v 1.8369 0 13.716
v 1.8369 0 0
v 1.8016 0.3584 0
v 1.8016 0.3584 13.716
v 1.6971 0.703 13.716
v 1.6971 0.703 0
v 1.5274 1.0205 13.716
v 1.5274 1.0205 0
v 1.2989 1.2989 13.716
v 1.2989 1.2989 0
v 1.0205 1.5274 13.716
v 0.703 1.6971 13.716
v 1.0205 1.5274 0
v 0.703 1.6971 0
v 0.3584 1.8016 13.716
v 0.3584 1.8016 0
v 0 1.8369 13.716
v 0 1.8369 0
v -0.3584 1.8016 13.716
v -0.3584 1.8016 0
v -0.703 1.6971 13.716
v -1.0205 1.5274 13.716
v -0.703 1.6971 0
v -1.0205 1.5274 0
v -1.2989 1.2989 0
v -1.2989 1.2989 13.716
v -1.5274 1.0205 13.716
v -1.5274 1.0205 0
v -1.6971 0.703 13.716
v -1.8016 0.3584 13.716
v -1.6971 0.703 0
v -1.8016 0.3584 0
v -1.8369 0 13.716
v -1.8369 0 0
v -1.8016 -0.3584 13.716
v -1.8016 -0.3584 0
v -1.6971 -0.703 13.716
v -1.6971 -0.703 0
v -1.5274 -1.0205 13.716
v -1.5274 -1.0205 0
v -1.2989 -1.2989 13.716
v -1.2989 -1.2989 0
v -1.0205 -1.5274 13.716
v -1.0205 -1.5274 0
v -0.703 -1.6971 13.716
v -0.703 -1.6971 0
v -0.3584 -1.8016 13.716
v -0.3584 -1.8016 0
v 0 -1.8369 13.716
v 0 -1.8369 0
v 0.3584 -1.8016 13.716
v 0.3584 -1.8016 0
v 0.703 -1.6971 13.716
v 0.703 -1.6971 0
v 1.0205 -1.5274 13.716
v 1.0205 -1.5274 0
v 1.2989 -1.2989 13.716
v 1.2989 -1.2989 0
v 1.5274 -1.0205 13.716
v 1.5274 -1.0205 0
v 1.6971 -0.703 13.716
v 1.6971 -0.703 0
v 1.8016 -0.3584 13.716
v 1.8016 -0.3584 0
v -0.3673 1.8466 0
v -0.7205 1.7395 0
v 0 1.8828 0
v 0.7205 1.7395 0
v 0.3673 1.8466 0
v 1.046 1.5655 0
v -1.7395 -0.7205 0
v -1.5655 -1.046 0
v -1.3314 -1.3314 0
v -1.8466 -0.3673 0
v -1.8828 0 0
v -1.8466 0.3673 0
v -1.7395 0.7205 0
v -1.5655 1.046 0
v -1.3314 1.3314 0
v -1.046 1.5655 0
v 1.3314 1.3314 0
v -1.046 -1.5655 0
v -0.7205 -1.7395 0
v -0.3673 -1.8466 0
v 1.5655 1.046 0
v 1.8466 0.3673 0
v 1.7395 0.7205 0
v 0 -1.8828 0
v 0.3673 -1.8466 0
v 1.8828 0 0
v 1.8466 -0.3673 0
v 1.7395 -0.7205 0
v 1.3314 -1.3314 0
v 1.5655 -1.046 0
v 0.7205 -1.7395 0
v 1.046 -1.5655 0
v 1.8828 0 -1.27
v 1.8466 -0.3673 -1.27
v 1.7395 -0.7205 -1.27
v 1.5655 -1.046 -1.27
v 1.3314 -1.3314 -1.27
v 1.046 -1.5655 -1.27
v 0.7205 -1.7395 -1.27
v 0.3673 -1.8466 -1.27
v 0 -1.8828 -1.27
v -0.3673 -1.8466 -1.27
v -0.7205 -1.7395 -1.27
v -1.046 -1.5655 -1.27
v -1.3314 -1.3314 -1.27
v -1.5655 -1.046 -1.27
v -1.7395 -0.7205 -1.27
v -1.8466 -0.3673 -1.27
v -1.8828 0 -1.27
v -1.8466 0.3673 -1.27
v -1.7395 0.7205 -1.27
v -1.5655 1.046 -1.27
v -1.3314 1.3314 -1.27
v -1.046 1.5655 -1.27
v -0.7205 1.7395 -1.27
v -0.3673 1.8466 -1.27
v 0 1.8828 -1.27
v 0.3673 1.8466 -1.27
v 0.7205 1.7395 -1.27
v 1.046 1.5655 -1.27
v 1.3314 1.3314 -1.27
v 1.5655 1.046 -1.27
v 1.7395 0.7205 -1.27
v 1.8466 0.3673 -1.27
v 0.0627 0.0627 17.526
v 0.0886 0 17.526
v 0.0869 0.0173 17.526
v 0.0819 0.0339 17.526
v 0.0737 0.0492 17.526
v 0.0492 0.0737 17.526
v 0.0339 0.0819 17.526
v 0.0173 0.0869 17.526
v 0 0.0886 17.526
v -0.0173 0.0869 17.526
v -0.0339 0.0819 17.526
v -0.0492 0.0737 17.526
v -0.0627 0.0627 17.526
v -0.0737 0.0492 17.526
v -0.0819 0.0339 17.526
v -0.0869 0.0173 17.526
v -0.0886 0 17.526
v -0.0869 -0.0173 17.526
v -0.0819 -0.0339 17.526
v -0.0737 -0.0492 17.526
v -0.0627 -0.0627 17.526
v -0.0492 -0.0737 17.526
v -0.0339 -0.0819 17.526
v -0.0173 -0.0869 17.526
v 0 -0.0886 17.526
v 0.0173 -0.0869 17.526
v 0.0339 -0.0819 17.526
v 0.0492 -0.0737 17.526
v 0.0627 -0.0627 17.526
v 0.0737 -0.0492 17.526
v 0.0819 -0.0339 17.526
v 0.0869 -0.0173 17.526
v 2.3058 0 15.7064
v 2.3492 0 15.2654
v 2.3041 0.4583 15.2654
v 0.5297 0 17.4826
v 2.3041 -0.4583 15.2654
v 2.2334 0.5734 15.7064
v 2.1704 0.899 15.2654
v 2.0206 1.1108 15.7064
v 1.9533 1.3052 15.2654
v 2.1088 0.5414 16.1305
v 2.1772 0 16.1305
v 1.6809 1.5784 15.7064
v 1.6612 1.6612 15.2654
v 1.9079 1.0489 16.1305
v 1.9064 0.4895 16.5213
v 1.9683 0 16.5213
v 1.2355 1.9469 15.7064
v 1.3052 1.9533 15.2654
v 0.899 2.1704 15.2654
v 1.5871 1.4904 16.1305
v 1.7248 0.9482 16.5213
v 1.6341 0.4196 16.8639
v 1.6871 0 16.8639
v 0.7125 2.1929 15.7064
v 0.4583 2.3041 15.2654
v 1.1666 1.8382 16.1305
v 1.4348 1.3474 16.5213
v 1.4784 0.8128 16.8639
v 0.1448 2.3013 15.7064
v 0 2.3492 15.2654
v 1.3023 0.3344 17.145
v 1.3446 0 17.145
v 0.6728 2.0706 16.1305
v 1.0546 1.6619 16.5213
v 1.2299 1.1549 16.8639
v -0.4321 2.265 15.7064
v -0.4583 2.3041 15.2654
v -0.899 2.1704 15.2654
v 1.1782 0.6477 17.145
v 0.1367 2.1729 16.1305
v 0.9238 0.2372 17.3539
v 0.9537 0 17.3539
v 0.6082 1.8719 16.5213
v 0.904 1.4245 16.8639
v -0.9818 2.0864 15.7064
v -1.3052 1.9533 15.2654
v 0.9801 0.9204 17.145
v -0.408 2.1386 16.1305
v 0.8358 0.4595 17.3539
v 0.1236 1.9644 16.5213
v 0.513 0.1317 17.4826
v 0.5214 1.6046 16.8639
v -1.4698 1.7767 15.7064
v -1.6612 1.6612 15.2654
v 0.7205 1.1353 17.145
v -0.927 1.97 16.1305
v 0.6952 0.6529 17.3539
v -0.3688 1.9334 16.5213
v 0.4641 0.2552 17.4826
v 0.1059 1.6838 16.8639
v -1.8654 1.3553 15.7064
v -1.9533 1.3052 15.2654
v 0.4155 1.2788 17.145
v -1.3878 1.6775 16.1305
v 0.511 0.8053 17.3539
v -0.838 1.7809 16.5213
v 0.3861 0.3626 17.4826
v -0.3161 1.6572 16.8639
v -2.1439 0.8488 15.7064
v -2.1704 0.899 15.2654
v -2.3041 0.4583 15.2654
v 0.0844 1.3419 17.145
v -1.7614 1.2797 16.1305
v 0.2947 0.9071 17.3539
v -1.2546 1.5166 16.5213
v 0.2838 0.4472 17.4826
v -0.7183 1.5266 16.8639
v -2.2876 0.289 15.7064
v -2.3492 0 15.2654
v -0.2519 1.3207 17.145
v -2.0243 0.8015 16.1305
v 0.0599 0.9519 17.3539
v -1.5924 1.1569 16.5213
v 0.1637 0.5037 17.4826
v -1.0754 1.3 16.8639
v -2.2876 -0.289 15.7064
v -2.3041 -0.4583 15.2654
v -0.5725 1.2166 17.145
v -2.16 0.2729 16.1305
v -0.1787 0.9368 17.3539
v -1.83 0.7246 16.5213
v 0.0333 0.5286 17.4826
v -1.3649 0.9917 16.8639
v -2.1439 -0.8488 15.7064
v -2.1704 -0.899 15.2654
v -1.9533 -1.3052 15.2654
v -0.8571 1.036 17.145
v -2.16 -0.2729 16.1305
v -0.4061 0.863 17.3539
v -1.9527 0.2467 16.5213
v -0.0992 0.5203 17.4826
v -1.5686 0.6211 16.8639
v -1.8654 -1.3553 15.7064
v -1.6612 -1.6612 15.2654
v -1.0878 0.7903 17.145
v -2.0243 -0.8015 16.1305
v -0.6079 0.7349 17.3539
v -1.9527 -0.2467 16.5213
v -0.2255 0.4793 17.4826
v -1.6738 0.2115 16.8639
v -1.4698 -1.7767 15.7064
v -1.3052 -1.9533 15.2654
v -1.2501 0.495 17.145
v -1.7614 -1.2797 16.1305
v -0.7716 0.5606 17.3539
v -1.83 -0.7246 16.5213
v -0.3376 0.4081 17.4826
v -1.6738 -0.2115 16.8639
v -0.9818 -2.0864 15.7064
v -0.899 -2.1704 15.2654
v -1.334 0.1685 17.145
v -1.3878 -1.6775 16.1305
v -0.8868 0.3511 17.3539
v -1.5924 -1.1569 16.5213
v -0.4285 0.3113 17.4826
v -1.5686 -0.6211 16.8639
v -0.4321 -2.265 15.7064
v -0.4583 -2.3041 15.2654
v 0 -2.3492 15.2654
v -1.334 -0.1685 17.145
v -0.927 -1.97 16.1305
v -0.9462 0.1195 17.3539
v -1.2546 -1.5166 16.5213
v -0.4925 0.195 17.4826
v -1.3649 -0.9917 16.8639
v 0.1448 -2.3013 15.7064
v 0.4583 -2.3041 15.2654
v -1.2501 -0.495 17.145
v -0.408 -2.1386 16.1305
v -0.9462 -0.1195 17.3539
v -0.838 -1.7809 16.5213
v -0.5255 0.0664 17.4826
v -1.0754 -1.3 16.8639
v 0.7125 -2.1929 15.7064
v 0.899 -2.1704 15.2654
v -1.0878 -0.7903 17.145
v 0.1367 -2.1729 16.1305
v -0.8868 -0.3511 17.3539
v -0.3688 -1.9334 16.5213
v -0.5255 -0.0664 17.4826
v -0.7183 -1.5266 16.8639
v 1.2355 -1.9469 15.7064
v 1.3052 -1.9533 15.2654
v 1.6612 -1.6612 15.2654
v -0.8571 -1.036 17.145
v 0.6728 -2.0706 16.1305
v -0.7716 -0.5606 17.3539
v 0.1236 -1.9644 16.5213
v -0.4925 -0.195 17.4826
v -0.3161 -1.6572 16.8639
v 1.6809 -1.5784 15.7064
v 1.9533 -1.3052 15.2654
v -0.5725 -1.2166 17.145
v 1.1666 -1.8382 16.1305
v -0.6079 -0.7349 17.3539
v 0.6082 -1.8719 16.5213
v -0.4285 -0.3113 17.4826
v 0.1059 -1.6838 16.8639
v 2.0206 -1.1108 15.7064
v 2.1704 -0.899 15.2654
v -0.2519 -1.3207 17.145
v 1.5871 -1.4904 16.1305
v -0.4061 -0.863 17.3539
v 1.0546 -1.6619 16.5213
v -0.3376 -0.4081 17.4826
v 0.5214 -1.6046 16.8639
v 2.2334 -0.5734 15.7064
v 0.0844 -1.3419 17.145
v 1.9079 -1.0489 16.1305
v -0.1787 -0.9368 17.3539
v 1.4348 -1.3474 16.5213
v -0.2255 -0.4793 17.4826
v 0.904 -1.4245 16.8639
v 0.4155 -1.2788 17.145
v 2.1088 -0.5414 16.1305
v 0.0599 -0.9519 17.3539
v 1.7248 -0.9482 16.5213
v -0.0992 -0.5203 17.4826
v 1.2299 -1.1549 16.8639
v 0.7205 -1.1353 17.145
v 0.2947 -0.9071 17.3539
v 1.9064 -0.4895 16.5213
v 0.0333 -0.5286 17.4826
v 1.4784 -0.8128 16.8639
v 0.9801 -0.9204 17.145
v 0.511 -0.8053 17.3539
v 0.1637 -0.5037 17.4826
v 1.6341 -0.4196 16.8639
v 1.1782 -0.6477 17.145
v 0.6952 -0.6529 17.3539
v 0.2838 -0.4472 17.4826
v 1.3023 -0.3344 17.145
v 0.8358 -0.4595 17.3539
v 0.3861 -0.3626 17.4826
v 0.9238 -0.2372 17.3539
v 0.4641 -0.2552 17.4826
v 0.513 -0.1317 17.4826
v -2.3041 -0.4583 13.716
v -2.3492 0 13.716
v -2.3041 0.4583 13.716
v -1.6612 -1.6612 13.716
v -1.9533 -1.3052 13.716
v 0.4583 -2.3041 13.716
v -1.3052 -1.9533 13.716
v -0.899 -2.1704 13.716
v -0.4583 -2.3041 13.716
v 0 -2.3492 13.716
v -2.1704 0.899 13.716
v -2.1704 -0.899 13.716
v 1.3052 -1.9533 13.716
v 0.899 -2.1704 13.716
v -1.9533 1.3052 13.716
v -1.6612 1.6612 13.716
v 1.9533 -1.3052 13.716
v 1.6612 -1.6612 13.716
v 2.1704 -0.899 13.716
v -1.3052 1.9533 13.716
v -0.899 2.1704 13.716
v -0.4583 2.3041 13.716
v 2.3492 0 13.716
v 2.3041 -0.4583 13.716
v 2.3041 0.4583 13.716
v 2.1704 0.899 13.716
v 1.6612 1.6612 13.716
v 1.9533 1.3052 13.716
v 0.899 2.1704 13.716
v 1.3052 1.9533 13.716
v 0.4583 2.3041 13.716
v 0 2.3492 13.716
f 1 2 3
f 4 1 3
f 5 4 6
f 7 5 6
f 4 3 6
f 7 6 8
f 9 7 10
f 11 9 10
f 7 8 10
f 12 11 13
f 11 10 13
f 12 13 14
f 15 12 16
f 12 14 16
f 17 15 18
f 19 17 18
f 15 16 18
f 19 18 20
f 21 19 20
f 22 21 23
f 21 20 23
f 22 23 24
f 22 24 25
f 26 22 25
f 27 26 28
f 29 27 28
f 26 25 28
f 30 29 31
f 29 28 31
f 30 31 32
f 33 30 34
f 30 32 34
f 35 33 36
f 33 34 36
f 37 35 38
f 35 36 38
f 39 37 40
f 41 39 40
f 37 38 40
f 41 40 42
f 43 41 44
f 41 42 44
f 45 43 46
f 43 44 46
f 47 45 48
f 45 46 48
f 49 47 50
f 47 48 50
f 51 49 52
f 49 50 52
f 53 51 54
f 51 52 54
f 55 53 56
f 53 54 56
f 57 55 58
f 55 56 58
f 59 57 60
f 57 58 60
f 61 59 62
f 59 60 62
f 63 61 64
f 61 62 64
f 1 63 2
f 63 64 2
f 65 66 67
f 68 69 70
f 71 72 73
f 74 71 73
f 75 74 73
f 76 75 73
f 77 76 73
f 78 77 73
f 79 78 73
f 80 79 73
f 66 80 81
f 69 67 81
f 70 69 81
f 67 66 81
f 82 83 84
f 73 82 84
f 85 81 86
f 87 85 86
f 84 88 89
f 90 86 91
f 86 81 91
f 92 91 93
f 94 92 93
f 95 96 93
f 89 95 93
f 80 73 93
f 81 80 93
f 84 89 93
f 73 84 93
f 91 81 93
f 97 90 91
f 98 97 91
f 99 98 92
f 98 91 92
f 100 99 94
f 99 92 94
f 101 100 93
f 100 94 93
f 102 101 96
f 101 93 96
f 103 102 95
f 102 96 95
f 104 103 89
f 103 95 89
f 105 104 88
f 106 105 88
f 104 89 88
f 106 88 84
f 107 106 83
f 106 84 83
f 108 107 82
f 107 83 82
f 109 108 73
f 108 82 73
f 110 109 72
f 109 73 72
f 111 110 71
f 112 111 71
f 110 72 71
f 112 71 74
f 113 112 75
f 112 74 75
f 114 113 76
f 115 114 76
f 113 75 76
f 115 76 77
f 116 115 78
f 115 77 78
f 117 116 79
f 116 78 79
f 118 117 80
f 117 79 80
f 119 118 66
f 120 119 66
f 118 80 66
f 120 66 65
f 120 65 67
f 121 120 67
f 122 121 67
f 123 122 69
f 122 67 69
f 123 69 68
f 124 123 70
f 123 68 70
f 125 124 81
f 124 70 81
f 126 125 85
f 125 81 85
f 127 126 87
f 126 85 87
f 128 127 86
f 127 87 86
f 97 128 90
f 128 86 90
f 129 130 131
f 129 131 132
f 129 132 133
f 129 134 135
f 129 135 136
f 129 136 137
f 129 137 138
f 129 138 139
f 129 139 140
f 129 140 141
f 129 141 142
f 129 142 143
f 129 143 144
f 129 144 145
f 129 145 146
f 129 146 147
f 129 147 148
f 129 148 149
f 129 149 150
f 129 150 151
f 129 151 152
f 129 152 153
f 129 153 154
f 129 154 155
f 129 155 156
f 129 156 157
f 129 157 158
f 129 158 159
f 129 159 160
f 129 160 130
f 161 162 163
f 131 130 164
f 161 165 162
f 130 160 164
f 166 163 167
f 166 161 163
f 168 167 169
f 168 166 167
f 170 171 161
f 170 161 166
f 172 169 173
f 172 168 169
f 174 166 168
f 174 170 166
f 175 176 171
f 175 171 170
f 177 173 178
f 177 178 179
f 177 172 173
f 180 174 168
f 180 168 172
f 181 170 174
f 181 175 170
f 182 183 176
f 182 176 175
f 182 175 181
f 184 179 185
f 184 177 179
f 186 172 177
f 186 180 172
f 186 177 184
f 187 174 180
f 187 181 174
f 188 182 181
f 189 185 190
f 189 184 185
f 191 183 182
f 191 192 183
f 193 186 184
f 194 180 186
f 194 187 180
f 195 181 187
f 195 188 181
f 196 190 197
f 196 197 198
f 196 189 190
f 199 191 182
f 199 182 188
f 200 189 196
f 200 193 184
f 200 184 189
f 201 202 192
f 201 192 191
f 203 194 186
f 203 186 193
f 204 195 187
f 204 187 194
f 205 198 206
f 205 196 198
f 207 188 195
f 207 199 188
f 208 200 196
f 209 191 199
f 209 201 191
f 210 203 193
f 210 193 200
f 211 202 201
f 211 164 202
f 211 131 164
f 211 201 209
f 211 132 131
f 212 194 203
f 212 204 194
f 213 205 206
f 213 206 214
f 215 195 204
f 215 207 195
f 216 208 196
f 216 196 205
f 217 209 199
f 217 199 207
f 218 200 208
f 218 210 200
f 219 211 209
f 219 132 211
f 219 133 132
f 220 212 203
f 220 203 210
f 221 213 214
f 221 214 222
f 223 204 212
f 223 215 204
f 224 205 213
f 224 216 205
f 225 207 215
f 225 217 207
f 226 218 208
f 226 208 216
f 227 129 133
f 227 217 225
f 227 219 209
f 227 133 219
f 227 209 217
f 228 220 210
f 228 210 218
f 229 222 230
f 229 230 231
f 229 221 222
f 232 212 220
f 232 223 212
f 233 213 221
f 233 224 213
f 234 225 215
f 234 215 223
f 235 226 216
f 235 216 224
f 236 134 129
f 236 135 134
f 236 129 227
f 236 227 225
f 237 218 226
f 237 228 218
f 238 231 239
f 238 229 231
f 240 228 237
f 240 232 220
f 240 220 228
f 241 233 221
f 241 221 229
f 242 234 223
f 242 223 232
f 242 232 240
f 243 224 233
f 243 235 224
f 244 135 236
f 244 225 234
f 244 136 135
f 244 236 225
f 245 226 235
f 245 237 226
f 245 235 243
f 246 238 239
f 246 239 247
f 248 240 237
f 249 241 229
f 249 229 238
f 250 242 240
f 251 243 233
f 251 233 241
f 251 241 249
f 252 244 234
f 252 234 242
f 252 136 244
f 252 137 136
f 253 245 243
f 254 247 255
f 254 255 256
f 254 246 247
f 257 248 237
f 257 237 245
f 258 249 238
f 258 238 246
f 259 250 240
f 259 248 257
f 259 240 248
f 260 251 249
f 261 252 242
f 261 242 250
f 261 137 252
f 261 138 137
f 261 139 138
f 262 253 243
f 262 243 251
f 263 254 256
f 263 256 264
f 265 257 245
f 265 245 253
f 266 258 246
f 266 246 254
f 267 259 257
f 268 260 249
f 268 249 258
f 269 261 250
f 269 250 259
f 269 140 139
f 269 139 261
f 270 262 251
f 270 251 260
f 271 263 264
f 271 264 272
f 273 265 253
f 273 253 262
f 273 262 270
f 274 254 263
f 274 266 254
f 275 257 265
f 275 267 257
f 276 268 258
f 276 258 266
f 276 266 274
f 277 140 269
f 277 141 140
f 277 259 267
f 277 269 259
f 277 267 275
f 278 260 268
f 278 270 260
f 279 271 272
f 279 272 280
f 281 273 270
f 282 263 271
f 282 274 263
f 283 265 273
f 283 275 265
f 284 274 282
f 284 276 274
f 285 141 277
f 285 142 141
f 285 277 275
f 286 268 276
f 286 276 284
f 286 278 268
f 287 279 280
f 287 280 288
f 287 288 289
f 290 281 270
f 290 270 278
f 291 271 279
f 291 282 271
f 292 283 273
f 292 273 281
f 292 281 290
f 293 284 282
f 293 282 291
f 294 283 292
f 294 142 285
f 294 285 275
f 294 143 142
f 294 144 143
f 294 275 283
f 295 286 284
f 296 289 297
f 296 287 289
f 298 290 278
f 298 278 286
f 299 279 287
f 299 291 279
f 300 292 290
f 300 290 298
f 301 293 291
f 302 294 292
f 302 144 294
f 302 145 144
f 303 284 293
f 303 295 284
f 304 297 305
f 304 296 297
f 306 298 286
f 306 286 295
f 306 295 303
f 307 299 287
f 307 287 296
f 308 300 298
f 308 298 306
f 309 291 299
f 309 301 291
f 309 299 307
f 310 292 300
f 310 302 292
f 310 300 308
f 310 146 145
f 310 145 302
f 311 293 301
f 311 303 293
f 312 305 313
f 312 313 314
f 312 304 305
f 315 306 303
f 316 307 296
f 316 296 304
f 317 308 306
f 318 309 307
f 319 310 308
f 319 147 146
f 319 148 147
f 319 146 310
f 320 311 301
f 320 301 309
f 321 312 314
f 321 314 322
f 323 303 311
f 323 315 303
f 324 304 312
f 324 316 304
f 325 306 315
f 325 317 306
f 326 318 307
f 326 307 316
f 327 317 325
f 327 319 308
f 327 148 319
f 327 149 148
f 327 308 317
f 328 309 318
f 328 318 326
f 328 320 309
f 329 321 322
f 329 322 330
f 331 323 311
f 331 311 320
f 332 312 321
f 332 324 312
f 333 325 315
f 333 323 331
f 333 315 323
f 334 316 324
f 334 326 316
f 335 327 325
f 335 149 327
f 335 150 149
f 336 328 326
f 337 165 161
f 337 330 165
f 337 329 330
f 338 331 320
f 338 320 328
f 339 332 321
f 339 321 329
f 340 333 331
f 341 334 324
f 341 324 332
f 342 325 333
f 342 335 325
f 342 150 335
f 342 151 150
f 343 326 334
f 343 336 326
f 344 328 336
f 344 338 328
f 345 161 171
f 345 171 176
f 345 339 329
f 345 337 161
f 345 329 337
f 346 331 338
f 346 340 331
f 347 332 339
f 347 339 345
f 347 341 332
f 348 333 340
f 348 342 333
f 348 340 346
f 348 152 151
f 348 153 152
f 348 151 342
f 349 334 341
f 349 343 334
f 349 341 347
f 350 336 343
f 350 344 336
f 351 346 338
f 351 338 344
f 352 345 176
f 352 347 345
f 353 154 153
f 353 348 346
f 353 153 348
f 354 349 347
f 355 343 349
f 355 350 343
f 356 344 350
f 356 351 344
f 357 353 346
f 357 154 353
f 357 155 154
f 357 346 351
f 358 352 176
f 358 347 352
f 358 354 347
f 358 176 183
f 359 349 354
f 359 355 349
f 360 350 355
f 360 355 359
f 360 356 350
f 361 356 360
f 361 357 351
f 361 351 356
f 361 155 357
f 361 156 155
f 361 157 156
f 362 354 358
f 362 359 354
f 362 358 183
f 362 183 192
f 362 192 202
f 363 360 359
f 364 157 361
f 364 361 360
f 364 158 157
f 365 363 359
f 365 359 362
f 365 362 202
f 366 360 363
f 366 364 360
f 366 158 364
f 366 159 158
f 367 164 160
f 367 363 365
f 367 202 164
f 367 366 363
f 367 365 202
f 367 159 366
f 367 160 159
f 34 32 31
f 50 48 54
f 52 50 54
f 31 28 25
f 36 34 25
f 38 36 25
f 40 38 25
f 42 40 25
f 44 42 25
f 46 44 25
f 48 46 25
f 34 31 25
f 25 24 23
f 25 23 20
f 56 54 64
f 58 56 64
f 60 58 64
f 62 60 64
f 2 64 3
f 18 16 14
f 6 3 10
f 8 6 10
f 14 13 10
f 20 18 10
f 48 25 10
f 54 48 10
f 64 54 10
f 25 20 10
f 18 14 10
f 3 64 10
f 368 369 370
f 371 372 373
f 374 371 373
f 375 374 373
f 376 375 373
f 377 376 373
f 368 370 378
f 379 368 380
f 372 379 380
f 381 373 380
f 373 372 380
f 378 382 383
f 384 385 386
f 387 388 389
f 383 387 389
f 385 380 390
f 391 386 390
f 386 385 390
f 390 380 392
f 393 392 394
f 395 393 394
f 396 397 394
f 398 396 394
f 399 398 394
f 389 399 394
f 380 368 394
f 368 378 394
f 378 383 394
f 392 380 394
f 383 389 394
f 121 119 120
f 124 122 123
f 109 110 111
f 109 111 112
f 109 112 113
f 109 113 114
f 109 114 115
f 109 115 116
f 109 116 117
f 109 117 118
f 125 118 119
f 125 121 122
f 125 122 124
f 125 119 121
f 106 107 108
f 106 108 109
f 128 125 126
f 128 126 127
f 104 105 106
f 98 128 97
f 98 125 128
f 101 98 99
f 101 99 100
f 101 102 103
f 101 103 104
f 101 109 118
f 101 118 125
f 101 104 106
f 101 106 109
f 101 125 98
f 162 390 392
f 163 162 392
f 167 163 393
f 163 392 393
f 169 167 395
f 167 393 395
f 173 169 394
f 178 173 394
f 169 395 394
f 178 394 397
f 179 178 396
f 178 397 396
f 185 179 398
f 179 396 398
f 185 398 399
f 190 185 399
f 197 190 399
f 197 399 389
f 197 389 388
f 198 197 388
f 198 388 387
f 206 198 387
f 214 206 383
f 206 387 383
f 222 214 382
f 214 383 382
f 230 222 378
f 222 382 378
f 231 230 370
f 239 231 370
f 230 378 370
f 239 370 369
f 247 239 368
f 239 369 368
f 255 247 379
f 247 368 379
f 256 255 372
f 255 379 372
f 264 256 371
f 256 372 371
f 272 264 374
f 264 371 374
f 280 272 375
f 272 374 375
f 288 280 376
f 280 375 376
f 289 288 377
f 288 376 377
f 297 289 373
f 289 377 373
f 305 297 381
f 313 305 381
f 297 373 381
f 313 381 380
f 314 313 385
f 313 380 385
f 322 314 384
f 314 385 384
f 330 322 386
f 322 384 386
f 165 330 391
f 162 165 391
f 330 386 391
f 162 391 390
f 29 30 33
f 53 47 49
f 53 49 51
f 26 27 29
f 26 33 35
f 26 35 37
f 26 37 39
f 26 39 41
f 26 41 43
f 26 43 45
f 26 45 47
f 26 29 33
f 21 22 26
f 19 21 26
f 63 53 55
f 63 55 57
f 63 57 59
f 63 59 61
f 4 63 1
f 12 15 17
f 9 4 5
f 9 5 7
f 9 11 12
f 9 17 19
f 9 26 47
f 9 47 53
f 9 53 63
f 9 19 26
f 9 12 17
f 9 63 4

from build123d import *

# Parameters (mm, degrees)
F0_R     = 1.8369282596
F1_DEPTH = 13.716
F2_R     = 2.3492385246
F3_DEPTH = 3.81
F4_R     = 2.2606
F5_R     = 1.8828271996
F5_R_2   = 1.8369282596
F6_DEPTH = 1.27


with BuildPart() as f1:
    # F0 (on Top) → F1 (new body)
    with BuildSketch(Plane.XY):
        Circle(F0_R)
    extrude(amount=F1_DEPTH)


with BuildPart() as f3:
    # F2 (on face) → F3 (new body)
    with BuildSketch(Plane.XY.offset(13.716)):
        Circle(F2_R)
    extrude(amount=F3_DEPTH)

    # F4
    f4_edges = [f3.edges().sort_by_distance(p)[0] for p in [
        (-2.349239, 0, 17.526),
    ]]
    fillet(f4_edges, radius=F4_R)


with BuildPart() as f6:
    # F5 (on face) → F6 (new body)
    with BuildSketch(Plane(origin=(0, 0, 0), x_dir=(1, 0, 0), z_dir=(0, 0, -1))):
        Circle(F5_R)
        Circle(F5_R_2, mode=Mode.SUBTRACT)
        Circle(F5_R_2)
    extrude(amount=F6_DEPTH)


solid = Compound([f1.part, f3.part, f6.part])
